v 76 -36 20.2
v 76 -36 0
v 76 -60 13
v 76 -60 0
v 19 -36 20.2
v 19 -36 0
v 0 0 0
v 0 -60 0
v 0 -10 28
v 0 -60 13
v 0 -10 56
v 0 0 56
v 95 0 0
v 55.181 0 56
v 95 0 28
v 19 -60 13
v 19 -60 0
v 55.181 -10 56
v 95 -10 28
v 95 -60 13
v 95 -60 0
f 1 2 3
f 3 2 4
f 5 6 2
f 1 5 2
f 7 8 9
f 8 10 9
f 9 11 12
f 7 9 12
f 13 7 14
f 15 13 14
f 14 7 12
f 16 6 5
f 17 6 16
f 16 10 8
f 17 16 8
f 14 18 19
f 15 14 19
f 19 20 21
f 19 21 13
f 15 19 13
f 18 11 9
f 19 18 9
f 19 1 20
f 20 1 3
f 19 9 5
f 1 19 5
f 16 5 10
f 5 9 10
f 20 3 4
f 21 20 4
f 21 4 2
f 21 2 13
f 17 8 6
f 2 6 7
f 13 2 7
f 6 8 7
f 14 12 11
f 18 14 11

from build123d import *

# Parameters (mm, degrees)
F1_DEPTH = 95
F3_DEPTH = 10.001
F4_W     = 57
F4_H     = 24
F5_DEPTH = 25


with BuildPart() as f1:
    # F0 (on Right) → F1 (new body)
    with BuildSketch(Plane.YZ):
        Polygon((-60, 0), (0, 0), (0, 56), (-10, 56), (-10, 28), (-60, 13), align=None)
    extrude(amount=F1_DEPTH)

    # F2 (on face) → F3 (cut, through all)
    with BuildSketch(Plane.XZ.offset(10)):
        Polygon((55.181451, 56), (95, 28), (95, 56), align=None)
    extrude(amount=-F3_DEPTH, mode=Mode.SUBTRACT)

    # F4 (on face) → F5 (cut)
    with BuildSketch(Plane(origin=(0, 0, 0), x_dir=(1, 0, 0), z_dir=(0, 0, -1))):
        with Locations((47.5, 48)):
            Rectangle(F4_W, F4_H)
    extrude(amount=-F5_DEPTH, mode=Mode.SUBTRACT)


solid = f1.part
